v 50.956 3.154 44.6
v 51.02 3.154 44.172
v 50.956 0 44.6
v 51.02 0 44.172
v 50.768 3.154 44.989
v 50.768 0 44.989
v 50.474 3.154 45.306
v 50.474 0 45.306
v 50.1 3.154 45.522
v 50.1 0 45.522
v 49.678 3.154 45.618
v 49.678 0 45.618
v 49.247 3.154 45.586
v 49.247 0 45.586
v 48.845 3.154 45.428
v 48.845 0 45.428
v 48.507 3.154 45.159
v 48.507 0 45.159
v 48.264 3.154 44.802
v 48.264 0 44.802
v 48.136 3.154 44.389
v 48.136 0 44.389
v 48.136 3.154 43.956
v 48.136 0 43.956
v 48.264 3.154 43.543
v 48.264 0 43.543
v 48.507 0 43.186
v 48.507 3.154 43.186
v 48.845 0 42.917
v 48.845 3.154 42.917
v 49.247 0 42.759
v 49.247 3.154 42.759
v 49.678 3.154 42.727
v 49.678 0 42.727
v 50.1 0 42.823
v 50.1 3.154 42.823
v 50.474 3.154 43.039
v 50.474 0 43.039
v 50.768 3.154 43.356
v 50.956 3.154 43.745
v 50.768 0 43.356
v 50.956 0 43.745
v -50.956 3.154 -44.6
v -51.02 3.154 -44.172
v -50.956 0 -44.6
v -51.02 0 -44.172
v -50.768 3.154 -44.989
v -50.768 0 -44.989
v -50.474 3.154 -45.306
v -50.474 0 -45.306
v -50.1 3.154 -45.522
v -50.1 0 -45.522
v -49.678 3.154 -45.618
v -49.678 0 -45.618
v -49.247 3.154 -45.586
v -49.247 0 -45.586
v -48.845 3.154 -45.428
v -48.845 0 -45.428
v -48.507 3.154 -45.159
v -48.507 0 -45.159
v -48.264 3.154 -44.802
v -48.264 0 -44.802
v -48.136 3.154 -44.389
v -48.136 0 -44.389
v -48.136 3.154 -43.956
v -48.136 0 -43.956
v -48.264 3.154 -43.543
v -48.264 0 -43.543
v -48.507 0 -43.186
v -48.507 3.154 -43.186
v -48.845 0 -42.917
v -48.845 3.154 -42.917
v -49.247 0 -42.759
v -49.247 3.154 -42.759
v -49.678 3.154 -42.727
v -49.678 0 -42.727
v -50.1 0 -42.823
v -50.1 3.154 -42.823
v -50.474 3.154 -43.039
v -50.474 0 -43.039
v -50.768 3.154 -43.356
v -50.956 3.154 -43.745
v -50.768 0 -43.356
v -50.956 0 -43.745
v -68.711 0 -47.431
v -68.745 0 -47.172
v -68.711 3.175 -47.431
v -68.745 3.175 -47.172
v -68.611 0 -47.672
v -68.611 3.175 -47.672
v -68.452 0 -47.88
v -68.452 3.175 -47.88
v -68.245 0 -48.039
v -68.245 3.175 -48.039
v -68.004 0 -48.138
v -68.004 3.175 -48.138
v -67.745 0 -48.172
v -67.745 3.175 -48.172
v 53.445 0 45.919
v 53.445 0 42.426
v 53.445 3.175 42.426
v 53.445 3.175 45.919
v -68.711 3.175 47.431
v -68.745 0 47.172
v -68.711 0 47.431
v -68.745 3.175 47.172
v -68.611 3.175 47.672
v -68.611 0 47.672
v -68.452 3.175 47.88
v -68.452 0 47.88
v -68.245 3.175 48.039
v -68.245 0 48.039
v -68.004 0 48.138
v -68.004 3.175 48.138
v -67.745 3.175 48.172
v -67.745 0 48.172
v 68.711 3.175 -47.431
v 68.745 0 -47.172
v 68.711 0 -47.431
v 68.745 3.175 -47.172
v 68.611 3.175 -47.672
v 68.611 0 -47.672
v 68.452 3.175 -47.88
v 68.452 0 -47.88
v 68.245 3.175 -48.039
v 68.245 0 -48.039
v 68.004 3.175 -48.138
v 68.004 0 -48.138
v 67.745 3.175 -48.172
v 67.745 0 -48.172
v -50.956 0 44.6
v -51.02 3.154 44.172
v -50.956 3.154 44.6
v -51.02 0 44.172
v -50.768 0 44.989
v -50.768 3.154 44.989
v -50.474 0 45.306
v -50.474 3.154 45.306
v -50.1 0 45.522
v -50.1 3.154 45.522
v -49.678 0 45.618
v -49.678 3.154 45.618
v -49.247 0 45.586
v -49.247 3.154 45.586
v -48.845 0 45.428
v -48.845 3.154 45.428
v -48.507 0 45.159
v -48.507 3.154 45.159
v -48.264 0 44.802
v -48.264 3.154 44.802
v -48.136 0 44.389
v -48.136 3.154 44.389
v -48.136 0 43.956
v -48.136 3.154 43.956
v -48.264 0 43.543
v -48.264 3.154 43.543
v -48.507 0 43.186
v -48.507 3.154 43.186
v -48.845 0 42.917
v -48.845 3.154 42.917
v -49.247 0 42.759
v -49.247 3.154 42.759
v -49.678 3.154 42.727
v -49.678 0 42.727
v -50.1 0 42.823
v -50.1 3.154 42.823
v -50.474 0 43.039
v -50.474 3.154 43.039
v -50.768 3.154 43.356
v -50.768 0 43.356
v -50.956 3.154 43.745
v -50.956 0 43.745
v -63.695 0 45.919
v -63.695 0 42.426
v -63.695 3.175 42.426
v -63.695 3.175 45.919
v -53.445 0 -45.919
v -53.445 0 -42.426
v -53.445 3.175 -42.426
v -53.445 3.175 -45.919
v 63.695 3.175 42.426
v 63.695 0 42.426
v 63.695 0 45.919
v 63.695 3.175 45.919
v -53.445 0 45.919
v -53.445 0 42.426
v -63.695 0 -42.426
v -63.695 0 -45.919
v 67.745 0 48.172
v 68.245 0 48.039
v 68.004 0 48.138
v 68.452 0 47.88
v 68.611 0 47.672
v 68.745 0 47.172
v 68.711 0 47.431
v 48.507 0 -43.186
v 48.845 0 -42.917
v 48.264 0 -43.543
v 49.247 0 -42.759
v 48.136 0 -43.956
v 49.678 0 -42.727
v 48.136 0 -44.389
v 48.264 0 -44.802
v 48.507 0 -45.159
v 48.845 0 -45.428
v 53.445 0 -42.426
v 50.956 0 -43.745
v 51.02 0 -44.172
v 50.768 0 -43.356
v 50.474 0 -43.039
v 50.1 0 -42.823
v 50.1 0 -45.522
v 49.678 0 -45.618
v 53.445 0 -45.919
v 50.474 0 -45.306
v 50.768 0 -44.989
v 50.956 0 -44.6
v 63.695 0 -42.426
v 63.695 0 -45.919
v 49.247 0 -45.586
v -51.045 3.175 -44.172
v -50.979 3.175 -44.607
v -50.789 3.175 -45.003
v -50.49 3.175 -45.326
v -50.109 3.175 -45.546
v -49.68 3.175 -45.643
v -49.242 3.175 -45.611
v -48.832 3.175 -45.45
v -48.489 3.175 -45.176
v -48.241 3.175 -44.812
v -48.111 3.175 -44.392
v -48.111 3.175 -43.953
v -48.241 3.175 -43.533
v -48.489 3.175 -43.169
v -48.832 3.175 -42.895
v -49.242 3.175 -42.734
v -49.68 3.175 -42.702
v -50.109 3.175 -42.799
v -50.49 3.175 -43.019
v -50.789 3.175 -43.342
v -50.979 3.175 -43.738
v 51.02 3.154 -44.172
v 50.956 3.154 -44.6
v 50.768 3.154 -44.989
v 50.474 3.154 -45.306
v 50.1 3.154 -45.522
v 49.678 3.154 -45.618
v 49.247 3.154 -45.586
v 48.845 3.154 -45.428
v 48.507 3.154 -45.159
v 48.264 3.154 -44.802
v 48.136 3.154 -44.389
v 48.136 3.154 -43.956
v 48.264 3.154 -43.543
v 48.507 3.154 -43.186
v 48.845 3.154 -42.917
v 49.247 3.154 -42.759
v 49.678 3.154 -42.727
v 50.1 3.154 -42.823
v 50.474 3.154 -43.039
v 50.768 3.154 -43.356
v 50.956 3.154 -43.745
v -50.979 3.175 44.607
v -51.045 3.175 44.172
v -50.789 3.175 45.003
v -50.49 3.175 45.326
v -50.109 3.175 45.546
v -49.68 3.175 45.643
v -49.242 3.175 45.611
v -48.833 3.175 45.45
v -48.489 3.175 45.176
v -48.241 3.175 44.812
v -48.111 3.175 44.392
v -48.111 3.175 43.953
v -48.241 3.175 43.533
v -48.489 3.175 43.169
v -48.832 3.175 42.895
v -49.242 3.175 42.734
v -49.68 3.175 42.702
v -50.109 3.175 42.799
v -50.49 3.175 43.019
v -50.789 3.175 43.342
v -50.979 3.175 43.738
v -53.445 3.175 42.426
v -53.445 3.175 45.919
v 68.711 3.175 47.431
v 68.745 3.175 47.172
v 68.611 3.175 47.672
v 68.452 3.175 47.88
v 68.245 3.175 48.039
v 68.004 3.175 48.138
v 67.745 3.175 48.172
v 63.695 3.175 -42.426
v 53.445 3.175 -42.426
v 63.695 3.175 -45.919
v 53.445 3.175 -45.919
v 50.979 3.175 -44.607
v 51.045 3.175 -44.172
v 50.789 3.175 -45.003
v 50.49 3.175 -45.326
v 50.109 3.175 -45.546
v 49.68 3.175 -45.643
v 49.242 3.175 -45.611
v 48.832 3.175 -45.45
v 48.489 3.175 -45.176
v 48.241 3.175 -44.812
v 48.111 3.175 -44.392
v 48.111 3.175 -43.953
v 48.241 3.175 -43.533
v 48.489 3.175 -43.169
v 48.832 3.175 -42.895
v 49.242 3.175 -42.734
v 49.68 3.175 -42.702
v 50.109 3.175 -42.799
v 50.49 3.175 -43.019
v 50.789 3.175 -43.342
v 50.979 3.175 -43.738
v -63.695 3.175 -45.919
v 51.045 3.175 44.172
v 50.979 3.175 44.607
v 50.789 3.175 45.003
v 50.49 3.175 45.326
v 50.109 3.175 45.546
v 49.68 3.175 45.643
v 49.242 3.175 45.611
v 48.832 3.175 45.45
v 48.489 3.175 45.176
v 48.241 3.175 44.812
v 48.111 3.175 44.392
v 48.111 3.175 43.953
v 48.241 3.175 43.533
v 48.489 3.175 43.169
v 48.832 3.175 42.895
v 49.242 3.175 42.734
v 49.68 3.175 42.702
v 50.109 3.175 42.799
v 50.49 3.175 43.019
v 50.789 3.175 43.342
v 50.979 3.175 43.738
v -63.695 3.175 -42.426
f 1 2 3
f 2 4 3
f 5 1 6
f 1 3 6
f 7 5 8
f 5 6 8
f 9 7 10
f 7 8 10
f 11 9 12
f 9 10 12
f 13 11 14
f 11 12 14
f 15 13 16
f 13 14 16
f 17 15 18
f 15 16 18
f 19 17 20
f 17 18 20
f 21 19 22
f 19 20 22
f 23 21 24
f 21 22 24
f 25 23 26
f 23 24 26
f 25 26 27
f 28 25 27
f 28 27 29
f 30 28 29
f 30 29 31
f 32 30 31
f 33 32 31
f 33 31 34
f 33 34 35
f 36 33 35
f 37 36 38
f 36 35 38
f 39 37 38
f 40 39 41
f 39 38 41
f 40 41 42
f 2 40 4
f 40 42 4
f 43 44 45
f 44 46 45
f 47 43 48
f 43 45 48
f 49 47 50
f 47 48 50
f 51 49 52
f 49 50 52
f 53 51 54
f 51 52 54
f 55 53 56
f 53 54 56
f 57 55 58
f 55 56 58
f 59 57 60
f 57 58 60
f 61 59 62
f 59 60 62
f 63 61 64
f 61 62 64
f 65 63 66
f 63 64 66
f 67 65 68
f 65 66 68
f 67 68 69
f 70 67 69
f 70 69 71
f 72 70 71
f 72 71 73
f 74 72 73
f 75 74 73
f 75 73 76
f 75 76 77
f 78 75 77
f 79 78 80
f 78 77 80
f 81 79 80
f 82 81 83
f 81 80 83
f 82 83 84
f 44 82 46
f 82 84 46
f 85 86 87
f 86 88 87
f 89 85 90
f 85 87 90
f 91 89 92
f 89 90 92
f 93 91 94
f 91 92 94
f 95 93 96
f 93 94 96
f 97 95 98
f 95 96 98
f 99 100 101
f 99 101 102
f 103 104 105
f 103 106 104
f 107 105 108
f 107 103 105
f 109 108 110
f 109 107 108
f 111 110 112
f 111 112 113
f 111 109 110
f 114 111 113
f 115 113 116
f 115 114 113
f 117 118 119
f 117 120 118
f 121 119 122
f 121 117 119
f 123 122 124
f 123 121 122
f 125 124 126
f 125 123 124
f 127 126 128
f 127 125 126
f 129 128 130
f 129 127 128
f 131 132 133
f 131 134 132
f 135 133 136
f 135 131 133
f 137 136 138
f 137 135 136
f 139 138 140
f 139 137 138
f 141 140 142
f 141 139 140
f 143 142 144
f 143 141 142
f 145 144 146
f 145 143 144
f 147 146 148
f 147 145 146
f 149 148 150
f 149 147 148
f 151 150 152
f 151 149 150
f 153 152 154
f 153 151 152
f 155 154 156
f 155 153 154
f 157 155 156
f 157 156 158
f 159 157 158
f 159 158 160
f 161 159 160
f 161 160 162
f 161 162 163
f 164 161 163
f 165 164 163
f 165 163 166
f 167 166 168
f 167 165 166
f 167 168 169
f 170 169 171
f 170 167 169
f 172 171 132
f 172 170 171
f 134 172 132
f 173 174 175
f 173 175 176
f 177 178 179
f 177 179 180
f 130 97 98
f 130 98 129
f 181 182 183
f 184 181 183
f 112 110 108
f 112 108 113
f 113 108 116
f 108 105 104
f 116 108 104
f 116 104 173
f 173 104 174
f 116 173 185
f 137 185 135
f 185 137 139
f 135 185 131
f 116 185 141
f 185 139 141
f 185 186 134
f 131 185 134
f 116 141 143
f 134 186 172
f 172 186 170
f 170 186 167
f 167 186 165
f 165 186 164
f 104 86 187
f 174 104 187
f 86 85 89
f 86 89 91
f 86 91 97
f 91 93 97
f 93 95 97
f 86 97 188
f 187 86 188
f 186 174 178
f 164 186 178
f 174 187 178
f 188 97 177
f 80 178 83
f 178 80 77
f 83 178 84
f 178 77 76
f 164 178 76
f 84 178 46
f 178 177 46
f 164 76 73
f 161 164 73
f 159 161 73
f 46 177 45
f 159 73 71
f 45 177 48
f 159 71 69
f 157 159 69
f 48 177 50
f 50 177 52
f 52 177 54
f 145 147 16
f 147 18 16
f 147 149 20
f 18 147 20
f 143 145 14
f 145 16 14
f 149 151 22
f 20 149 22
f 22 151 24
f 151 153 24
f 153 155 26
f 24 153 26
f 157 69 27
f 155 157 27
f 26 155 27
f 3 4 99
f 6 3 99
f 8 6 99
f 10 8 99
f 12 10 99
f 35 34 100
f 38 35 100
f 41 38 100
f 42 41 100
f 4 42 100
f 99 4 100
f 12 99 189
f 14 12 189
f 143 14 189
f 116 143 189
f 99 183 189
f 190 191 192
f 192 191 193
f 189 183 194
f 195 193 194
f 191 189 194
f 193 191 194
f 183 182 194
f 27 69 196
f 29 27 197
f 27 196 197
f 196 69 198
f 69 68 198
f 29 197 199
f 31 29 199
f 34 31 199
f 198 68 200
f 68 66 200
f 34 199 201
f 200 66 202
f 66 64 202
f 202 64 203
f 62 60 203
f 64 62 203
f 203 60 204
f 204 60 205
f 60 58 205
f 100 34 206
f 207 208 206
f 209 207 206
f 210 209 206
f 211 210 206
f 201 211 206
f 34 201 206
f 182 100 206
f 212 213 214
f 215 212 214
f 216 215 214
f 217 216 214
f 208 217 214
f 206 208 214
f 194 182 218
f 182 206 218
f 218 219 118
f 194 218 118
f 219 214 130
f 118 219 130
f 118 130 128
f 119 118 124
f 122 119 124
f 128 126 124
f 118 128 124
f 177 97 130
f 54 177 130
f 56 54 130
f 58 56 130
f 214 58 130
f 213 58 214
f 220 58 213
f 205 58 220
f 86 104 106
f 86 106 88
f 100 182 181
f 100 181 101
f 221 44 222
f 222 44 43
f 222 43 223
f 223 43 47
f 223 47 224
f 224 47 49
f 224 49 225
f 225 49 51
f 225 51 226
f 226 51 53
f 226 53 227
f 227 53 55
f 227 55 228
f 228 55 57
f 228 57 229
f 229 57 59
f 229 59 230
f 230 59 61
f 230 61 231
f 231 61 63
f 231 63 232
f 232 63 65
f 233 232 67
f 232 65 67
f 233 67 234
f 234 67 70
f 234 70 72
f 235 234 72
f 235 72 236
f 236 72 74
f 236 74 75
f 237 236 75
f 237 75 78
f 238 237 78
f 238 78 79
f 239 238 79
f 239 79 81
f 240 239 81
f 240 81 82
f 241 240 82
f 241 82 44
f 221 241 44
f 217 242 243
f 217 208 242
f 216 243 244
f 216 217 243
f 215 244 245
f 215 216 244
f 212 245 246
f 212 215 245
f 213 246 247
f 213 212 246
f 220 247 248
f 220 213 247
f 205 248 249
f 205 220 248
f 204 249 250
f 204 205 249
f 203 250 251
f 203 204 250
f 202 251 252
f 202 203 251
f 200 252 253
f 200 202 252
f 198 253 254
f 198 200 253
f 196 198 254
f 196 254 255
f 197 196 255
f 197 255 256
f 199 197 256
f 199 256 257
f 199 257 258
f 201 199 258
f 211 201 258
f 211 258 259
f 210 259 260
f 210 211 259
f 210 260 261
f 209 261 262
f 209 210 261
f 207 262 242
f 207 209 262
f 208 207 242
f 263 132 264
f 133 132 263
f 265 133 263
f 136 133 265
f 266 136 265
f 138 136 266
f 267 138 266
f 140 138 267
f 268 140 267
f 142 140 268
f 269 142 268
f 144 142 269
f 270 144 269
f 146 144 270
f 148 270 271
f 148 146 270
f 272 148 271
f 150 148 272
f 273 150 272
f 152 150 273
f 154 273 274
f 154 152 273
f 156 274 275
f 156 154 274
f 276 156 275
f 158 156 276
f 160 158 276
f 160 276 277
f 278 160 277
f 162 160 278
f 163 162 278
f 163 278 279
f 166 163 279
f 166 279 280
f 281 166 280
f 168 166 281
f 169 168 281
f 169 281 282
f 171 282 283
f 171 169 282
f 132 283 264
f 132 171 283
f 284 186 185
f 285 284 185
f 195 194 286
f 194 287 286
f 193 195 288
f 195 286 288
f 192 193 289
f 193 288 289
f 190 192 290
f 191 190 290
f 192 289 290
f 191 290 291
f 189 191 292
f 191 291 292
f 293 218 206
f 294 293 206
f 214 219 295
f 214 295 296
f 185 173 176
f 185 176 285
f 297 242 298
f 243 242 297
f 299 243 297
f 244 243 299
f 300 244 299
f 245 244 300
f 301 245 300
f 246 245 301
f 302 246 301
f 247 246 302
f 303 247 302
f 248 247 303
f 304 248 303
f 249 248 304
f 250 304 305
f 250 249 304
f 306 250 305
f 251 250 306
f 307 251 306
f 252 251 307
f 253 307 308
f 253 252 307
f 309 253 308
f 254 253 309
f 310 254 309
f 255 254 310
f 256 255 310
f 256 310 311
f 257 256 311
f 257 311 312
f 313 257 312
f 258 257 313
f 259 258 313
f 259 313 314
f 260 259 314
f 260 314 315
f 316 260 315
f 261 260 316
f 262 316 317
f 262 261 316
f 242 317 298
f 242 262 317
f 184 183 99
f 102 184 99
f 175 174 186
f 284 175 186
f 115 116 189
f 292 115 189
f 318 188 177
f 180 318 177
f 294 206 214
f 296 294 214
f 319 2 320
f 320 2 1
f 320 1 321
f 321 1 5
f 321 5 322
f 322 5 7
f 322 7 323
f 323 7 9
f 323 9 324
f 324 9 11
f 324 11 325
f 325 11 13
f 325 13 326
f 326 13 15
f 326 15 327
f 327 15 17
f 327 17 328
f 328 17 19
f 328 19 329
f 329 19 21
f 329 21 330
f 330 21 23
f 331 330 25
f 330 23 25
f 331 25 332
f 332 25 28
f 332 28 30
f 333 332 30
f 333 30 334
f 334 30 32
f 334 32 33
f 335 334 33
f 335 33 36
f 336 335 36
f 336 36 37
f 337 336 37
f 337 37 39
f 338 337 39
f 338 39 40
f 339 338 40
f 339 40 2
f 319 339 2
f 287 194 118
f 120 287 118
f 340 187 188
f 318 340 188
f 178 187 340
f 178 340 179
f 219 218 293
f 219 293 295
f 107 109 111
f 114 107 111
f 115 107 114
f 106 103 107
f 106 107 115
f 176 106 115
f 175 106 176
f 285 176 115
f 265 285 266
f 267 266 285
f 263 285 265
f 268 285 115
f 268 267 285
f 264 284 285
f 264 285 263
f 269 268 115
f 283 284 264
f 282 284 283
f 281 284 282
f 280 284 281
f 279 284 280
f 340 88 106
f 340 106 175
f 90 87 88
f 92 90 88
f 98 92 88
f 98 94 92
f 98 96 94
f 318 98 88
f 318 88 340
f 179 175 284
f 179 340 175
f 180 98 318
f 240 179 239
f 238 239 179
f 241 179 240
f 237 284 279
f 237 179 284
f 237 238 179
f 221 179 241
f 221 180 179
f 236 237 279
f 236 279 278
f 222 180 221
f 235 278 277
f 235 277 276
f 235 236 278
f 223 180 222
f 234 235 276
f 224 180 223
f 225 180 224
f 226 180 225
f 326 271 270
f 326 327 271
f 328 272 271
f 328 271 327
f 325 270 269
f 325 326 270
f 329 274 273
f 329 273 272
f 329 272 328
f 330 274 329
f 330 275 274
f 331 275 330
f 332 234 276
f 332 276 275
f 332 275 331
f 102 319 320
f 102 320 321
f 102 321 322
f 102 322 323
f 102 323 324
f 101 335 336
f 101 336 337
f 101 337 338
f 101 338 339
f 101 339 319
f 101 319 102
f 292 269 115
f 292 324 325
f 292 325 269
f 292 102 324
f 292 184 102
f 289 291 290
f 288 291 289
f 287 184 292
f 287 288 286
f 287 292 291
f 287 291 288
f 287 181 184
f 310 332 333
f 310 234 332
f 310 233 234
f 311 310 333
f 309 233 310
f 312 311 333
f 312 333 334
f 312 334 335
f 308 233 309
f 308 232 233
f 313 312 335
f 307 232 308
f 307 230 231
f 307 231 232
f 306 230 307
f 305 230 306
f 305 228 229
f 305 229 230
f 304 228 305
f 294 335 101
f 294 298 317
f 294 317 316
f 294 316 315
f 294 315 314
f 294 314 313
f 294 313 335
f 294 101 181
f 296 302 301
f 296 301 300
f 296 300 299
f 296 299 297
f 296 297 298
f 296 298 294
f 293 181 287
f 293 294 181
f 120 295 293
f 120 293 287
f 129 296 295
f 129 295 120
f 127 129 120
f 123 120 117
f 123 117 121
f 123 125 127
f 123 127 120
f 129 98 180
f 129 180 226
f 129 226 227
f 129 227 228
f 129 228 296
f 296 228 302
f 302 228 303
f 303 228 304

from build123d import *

# Parameters (mm, degrees)
SKETCH1_W                                      = 137.49
SKETCH1_H                                      = 96.345
SKETCH1_R                                      = 2.5
SKETCH1_W_2                                    = 10.25
SKETCH1_H_2                                    = 3.4925
BOSS_EXTRUDE1_DEPTH                            = 3.175
CUT_EXTRUDE1_START                             = -1
SKETCH1_3_W                                    = 10.25
SKETCH1_3_H                                    = 3.4925
CUT_EXTRUDE1_DEPTH                             = 5.175
M2_5_CLEARANCE_HOLE1_D                         = 2.9
M2_5_CLEARANCE_HOLE1_CSINK_D                   = 2.95
M2_5_CLEARANCE_HOLE1_CSINK_ANGLE               = 100
MIRROR1_START                                  = -1
MIRROR1_AT_THE_SECOND_PLANE_COPY_1_SKETC_W     = 10.25
MIRROR1_AT_THE_SECOND_PLANE_COPY_1_SKETC_H     = 3.4925
MIRROR1_AT_THE_SECOND_PLANE_COPY_1_DEPTH       = 5.175
MIRROR1_AT_THE_SECOND_PLANE_COPY_2_D           = 2.9
MIRROR1_AT_THE_SECOND_PLANE_COPY_2_CSINK_D     = 2.95
MIRROR1_AT_THE_SECOND_PLANE_COPY_2_CSINK_ANGLE = 100
FILLET1_R                                      = 1


with BuildPart() as part:
    # Sketch1 → Boss-Extrude1 (new body)
    with BuildSketch(Plane(origin=(0, 0, 0), x_dir=(1, 0, 0), z_dir=(0, 1, 0))):
        Rectangle(SKETCH1_W, SKETCH1_H)
        with Locations((-49.57, 44.1725)):
            Circle(SKETCH1_R, mode=Mode.SUBTRACT)
        with Locations((-58.57, 44.1725)):
            Rectangle(SKETCH1_W_2, SKETCH1_H_2, mode=Mode.SUBTRACT)
        with Locations((-58.57, 44.1725)):
            Rectangle(SKETCH1_W_2, SKETCH1_H_2)
        with Locations((-49.57, 44.1725)):
            Circle(SKETCH1_R)
    extrude(amount=BOSS_EXTRUDE1_DEPTH)

    # Sketch1<3> → Cut-Extrude1 (cut)
    with BuildSketch(Plane(origin=(0, 0, 0), x_dir=(1, 0, 0), z_dir=(0, 1, 0)).offset(CUT_EXTRUDE1_START)):
        with Locations((-58.57, 44.1725)):
            Rectangle(SKETCH1_3_W, SKETCH1_3_H)
    cut_extrude1 = extrude(amount=CUT_EXTRUDE1_DEPTH, mode=Mode.SUBTRACT)

    # M2.5 Clearance Hole1 (through all)
    with Locations(Plane(origin=(0, 3.175, 0), x_dir=(1, 0, 0), z_dir=(0, 1, 0))):
        with Locations((-49.57, 44.1725)):
            m2_5_clearance_hole1 = CounterSinkHole(M2_5_CLEARANCE_HOLE1_D / 2, M2_5_CLEARANCE_HOLE1_CSINK_D / 2, counter_sink_angle=M2_5_CLEARANCE_HOLE1_CSINK_ANGLE)

    # Mirror1: Cut-Extrude1, M2.5 Clearance Hole1 across plane
    add(cut_extrude1.mirror(Plane(origin=(0, 0, 0), x_dir=(0, 0, 1), z_dir=(1, 0, 0))), mode=Mode.SUBTRACT)
    add(m2_5_clearance_hole1.mirror(Plane(origin=(0, 0, 0), x_dir=(0, 0, 1), z_dir=(1, 0, 0))), mode=Mode.SUBTRACT)

    # Mirror1 at the second plane: M2.5 Clearance Hole1, Cut-Extrude1 across plane
    add(m2_5_clearance_hole1.mirror(Plane.XY), mode=Mode.SUBTRACT)
    add(cut_extrude1.mirror(Plane.XY), mode=Mode.SUBTRACT)

    # Mirror1 at the second plane copy 1 sketc → Mirror1 at the second plane copy 1 (cut)
    with BuildSketch(Plane(origin=(0, 0, 0), x_dir=(-1, 0, 0), z_dir=(0, 1, 0)).offset(MIRROR1_START)):
        with Locations((-58.57, 44.1725)):
            Rectangle(MIRROR1_AT_THE_SECOND_PLANE_COPY_1_SKETC_W, MIRROR1_AT_THE_SECOND_PLANE_COPY_1_SKETC_H)
    extrude(amount=MIRROR1_AT_THE_SECOND_PLANE_COPY_1_DEPTH, mode=Mode.SUBTRACT)

    # Mirror1 at the second plane copy 2 (through all)
    with Locations(Plane(origin=(0, 3.175, 0), x_dir=(-1, 0, 0), z_dir=(0, 1, 0))):
        with Locations((-49.57, 44.1725)):
            CounterSinkHole(MIRROR1_AT_THE_SECOND_PLANE_COPY_2_D / 2, MIRROR1_AT_THE_SECOND_PLANE_COPY_2_CSINK_D / 2, counter_sink_angle=MIRROR1_AT_THE_SECOND_PLANE_COPY_2_CSINK_ANGLE)

    # Fillet1
    fillet1_edges = [part.edges().sort_by_distance(p)[0] for p in [
        (-68.745, 1.5875, 48.1725),
        (-68.745, 1.5875, -48.1725),
        (68.745, 1.5875, -48.1725),
        (68.745, 1.5875, 48.1725),
    ]]
    fillet(fillet1_edges, radius=FILLET1_R)


solid = part.part
